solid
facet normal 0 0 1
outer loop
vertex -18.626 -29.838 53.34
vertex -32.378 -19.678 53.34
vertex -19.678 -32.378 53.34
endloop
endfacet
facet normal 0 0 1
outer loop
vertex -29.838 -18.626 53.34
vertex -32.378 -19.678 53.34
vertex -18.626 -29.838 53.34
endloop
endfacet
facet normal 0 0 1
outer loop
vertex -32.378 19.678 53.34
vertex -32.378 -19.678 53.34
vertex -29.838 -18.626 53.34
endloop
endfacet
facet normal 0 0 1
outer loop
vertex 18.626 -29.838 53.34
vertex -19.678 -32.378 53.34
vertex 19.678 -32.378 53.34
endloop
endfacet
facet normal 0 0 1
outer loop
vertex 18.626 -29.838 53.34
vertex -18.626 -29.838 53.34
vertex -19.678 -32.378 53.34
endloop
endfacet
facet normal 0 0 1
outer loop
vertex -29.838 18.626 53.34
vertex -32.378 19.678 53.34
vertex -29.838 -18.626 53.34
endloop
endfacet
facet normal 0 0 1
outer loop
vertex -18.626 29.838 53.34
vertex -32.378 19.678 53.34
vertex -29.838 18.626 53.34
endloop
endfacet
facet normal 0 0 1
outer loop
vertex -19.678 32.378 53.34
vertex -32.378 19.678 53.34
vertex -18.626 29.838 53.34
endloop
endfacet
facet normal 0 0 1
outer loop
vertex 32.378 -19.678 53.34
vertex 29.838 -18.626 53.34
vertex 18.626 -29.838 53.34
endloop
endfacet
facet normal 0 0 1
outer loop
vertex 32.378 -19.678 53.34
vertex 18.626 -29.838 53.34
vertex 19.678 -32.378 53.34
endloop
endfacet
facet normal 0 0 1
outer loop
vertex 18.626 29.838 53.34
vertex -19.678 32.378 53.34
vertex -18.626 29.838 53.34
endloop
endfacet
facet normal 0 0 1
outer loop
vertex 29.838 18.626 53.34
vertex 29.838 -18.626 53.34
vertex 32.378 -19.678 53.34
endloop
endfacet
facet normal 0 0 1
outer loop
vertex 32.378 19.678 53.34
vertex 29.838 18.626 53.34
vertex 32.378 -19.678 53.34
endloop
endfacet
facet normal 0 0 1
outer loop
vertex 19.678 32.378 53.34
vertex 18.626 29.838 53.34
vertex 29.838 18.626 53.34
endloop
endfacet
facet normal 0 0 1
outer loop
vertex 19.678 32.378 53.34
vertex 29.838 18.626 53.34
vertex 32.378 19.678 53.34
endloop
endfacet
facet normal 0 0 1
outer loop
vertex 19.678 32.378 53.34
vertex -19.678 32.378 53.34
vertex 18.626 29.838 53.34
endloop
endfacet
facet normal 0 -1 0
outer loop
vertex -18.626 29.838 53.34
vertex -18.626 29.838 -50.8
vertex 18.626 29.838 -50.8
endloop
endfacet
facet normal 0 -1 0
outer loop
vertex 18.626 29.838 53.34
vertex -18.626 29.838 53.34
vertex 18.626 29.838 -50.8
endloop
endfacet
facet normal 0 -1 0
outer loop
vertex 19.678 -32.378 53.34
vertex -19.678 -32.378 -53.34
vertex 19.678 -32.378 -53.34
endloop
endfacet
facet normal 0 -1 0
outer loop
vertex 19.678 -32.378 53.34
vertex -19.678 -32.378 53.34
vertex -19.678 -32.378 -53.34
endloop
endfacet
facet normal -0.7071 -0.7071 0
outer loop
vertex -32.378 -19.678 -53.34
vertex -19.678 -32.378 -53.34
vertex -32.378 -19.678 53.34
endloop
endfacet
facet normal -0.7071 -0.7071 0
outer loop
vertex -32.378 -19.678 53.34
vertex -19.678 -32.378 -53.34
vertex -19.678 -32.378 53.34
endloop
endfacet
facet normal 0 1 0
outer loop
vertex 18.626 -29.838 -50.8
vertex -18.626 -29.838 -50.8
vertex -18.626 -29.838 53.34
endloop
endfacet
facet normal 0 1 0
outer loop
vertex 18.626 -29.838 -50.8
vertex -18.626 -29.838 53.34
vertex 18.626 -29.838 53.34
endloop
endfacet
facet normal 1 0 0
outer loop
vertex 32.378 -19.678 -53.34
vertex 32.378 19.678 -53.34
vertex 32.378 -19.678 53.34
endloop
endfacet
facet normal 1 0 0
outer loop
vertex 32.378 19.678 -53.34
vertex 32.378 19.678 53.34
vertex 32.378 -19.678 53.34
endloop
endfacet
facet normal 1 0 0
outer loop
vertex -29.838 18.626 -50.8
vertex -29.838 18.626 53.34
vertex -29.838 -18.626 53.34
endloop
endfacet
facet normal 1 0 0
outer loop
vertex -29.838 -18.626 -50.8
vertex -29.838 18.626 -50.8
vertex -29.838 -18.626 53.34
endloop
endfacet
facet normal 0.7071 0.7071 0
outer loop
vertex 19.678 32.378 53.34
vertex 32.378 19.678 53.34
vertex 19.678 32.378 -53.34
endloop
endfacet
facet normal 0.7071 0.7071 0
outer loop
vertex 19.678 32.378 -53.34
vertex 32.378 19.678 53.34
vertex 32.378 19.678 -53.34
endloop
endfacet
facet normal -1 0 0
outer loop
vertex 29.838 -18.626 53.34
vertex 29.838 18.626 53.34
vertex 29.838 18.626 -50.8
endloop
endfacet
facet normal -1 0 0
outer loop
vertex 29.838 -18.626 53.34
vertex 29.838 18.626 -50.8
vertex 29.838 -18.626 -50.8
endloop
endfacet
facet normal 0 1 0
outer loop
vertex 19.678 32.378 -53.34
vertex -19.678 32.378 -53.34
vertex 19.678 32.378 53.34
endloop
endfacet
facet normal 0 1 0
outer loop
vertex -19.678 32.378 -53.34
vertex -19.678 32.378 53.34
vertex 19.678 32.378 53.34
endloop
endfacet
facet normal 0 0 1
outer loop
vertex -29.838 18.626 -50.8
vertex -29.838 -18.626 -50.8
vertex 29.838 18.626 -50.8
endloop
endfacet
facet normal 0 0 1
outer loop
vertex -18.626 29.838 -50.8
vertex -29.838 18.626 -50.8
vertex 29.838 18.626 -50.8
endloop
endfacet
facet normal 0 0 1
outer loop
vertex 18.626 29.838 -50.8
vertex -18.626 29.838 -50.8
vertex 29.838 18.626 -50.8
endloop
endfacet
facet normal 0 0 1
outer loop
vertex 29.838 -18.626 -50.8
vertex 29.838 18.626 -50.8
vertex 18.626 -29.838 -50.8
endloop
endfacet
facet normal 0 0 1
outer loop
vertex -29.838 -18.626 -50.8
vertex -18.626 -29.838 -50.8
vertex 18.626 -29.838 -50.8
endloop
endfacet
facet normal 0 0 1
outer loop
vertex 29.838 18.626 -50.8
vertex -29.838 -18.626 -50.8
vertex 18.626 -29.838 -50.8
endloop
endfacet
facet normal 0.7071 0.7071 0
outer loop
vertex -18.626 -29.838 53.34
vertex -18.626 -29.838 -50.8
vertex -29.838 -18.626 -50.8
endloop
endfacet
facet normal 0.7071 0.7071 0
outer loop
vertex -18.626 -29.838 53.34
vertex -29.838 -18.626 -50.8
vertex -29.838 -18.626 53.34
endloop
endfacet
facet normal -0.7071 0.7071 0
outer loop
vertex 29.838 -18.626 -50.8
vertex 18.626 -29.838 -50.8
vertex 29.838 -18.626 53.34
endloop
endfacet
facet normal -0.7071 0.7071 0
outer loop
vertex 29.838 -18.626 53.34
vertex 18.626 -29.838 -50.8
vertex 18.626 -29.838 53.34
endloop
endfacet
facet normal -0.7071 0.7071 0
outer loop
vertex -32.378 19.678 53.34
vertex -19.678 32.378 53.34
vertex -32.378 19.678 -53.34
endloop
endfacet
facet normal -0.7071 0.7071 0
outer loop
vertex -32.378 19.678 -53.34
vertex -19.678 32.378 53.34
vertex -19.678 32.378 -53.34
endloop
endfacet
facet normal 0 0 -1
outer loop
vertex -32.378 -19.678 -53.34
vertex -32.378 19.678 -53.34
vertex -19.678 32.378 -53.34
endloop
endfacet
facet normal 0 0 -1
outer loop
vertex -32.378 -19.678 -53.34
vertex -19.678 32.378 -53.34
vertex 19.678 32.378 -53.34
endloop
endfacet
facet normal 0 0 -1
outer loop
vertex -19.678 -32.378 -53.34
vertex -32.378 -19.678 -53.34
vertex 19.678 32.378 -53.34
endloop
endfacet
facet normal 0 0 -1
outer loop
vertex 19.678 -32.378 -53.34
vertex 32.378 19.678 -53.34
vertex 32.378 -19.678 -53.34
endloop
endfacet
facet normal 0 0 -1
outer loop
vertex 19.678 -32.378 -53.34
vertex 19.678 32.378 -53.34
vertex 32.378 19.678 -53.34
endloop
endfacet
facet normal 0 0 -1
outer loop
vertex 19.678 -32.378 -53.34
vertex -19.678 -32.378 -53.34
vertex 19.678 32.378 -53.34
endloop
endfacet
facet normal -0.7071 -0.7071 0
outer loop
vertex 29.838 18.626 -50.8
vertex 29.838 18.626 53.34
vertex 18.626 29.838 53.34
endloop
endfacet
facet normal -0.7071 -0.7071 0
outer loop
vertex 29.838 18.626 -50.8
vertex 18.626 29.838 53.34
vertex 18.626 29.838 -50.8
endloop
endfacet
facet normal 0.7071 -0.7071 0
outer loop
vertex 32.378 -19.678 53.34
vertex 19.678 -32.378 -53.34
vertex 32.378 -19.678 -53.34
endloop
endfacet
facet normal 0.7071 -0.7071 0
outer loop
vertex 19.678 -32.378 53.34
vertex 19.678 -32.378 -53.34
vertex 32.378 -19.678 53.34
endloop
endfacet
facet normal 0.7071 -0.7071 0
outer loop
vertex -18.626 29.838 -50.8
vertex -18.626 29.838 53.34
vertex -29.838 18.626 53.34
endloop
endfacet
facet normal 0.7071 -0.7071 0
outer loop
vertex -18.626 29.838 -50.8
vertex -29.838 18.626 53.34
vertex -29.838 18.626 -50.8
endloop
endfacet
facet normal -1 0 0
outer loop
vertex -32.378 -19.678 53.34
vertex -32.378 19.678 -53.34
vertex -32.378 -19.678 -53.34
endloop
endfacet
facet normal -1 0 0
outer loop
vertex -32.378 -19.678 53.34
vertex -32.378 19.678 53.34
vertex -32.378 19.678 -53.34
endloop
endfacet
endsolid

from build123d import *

# Parameters (mm, degrees)
F0_W      = 64.756296
F0_H      = 64.756296
F1_DEPTH  = 53.34
F1_FACE_W = 64.756296
F1_FACE_H = 64.756296
F2_DEPTH  = 53.34
F3_SIZE   = 12.7
F4_SIZE   = 12.7
F5_SIZE   = 12.7
F6_SIZE   = 12.7
F7_T      = -2.54


with BuildPart() as f1:
    # F0 (on Top) → F1 (new body)
    with BuildSketch(Plane.XY):
        Rectangle(F0_W, F0_H)
    extrude(amount=F1_DEPTH)

    # F1_face (on face) → F2 (join)
    with BuildSketch(Plane(origin=(0, 0, 0), x_dir=(1, 0, 0), z_dir=(0, 0, -1))):
        Rectangle(F1_FACE_W, F1_FACE_H)
    extrude(amount=F2_DEPTH)

    # F3
    f3_edges = [f1.edges().sort_by_distance(p)[0] for p in [
        (-32.378148, -32.378148, 0),
    ]]
    chamfer(f3_edges, length=F3_SIZE)

    # F4
    f4_edges = [f1.edges().sort_by_distance(p)[0] for p in [
        (-32.378148, 32.378148, 0),
    ]]
    chamfer(f4_edges, length=F4_SIZE)

    # F5
    f5_edges = [f1.edges().sort_by_distance(p)[0] for p in [
        (32.378148, 32.378148, 0),
    ]]
    chamfer(f5_edges, length=F5_SIZE)

    # F6
    f6_edges = [f1.edges().sort_by_distance(p)[0] for p in [
        (32.378148, -32.378148, 0),
    ]]
    chamfer(f6_edges, length=F6_SIZE)

    # F7
    f7_openings = [f1.faces().sort_by_distance(p)[0] for p in [
        (0, 0, 53.34),
    ]]
    offset(amount=F7_T, openings=f7_openings)


solid = f1.part
